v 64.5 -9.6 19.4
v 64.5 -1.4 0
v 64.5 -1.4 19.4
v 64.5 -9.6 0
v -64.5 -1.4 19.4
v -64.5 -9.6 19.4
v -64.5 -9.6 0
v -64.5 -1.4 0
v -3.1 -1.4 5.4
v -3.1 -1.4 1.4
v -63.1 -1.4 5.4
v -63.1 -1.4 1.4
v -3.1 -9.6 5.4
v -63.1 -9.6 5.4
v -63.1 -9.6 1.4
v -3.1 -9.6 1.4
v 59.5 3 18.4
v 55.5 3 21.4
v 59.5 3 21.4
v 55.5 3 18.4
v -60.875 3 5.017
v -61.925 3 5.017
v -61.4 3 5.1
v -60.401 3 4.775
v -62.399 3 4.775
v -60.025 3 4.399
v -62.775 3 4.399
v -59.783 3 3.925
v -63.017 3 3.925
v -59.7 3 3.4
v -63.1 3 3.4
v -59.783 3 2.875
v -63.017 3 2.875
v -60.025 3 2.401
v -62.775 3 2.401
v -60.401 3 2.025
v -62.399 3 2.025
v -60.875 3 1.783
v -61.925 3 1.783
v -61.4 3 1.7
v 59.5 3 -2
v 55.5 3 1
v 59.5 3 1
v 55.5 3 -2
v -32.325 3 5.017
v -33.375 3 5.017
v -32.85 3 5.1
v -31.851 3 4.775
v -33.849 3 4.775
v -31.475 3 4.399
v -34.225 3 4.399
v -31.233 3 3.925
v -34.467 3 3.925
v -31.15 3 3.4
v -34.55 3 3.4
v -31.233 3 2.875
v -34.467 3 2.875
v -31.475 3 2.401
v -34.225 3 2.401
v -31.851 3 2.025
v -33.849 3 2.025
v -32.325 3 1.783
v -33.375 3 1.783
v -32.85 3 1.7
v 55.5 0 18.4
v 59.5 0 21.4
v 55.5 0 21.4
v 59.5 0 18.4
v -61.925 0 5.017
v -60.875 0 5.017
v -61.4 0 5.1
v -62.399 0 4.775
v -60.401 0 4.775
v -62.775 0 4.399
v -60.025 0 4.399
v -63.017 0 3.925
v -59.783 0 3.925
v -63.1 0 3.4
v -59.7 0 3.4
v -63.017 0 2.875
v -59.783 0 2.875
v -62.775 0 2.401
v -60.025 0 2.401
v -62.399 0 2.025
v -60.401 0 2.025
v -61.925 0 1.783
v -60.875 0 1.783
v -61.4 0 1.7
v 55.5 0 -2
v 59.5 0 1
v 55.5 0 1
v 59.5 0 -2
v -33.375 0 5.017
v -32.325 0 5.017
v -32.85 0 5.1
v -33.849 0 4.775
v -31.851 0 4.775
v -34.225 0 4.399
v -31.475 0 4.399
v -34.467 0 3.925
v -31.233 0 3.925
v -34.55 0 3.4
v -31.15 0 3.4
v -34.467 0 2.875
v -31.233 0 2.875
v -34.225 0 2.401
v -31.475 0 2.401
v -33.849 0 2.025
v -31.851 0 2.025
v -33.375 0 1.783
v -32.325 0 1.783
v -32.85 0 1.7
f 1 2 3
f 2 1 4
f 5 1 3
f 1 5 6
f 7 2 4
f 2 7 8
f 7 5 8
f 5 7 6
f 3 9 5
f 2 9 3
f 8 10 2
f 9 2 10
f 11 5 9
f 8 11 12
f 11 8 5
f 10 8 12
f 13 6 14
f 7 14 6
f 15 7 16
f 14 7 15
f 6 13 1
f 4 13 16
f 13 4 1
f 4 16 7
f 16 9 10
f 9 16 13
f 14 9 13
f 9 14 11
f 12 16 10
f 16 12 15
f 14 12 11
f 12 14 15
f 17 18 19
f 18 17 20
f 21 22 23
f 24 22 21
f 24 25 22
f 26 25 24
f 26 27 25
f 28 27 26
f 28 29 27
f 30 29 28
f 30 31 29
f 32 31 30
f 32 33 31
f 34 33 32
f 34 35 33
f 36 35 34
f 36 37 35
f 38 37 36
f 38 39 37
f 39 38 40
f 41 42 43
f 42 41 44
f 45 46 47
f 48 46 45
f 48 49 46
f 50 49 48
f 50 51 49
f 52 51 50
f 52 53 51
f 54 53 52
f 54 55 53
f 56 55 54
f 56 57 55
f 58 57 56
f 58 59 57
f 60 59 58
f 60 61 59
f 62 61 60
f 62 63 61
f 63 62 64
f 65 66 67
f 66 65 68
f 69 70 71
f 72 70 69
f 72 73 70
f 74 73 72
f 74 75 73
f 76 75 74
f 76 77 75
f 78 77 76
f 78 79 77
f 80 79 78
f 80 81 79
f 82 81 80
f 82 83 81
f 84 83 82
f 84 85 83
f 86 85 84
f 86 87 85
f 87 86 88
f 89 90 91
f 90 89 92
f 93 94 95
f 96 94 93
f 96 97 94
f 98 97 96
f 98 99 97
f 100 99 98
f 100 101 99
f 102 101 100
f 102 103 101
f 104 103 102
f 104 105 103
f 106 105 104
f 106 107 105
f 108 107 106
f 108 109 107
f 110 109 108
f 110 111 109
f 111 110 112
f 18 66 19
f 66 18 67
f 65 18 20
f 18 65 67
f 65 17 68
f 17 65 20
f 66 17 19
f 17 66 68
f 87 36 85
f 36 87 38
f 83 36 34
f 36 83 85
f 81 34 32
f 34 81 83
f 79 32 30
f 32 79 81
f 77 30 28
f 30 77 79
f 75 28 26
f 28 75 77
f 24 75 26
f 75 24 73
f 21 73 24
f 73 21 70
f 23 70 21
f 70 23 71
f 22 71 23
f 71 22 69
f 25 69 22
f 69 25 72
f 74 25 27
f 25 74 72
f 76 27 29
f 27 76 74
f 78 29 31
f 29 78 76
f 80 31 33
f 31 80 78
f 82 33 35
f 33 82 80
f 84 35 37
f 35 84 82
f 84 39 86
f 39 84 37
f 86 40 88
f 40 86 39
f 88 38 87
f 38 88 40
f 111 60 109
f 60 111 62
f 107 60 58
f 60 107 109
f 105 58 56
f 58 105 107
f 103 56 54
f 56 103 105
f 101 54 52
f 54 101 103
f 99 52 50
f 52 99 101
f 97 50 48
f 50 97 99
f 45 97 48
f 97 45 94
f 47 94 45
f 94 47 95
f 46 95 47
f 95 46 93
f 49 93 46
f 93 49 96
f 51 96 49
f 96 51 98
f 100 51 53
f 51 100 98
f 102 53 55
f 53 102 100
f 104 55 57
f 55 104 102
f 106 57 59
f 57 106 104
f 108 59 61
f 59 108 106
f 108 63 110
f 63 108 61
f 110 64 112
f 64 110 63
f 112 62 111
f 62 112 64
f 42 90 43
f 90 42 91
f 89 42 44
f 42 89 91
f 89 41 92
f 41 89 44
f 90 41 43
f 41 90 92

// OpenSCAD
// file: smooth_model.scad
// Smoothness Parameters - Modeling
// Developed by: Michael McCool
// Copyright 2016 Intel Corporation
// License: CC-BY.  See LICENSE.md

sm_base = 5;  // base smoothness value for modeling
// file: r200_params.scad
// Basic Model of Intel(R) RealSense(TM) R200 Depth Camera
//   also includes cutting plan for basic mounting
// Developed b0y: Michael McCool
// Copyright 2016 Intel Corporation
// License: CC-BY.  See LICENSE.md

// All units in mm unless noted otherwise.

// CAMERA PARAMETERS

// basic overall size of camera
r200_x = 129;
r200_y = 8.2;
r200_z = 19.4;

// size and location of slot in camera
r200_sx = 60;
r200_sz = 4;
r200_six = 1.4;
r200_siz = 1.4;

// CAMERA MOUNT PARAMETERS
// size of mounting slot in frame
r200_mount_slot_x = 4; // width of slot
r200_mount_slot_y = 2; // height of slot
r200_mount_slot_ey = 1; // slot notch depth (behind camera)
r200_mount_slot_ix = 5; // offset of notch from end of camera

r200_mount_hole_r = m3_hole_radius;
r200_mount_hole_ix = r200_six + r200_mount_hole_r;
r200_mount_hole_iz = r200_siz + r200_sz/2;
r200_mount_hole_dx = r200_sx - r200_mount_hole_r - r200_six;
r200_mount_hole_sm = 4*sm_base;

// thickness of magnetic mounting plate and tape
r200_plate_thick = 1.4;

// defaults 
r200_mount_hole_p = 0.5;  // relative location of inner mounting hole
r200_mount_hole_t = 0.2;  // tolerance of mounting hole
r200_mount_slot_t = 0.0;  // tolerance of mounting slot
// file: bolt_params.scad
// Nuts, Bolts, Spacers, Standoffs, Washers, etc.
//  For visualization only.  
//  Models are missing important details (like threads).
// Developed by: Michael McCool
// Copyright 2017 Intel Corporation
// License: CC-BY-4.0.  See LICENSE.md

// normally include the following externally, so comment out here
//include <tols.scad>
//include <smooth.scad>

// convenience function
function hex_size_to_radius(size) = size / (2 * cos(30));

// Smoothness

// Default colors
bolt_color = [0.5,0.5,0.7,0.9];
nut_color = [0.5,0.6,0.6,0.9];
spacer_color = [0.5,0.5,0.5,0.9];

// Radius of *unthreaded* part of the shaft (exact only for shoulder)
m2_shaft_radius   = 2/2;
m2_5_shaft_radius = 2.5/2;
m3_shaft_radius   = 3/2;
m4_shaft_radius   = 4/2;
m5_shaft_radius   = 5/2;
m6_shaft_radius   = 6/2;

// Threaded part of the shaft is slightly narrower
m2_thread_radius   = 1.86/2;
m2_5_thread_radius = 2.36/2;
m3_thread_radius   = 2.86/2;
m4_thread_radius   = 3.82/2;
m5_thread_radius   = 4.82/2;
m6_thread_radius   = 5.82/2;

// Cap radius
m2_cap_radius   = 4/2;
m2_5_cap_radius = 4.7/2;
m3_cap_radius   = 5.7/2;
m4_cap_radius   = 7.22/2;
m5_cap_radius   = 8.72/2;
m6_cap_radius   = 10.22/2;

// Cap height
m2_cap_height   = 2*m2_shaft_radius;
m2_5_cap_height = 2*m2_5_shaft_radius;
m3_cap_height   = 2*m3_shaft_radius;
m4_cap_height   = 2*m4_shaft_radius;
m5_cap_height   = 2*m5_shaft_radius;
m6_cap_height   = 2*m6_shaft_radius;

// Socket size (from hex face to hex face)
m2_socket_size   = 1.58;
m2_5_socket_size = 2.08;
m3_socket_size   = 2.58;
m4_socket_size   = 3.08;
m5_socket_size   = 4.1;
m6_socket_size   = 5.14;

// Socket radius (center to hex vertex)
m2_socket_radius   = hex_size_to_radius(m2_socket_size);
m2_5_socket_radius = hex_size_to_radius(m2_5_socket_size);
m3_socket_radius   = hex_size_to_radius(m3_socket_size);
m4_socket_radius   = hex_size_to_radius(m4_socket_size);
m5_socket_radius   = hex_size_to_radius(m5_socket_size);
m6_socket_radius   = hex_size_to_radius(m6_socket_size);

// Nut size (from hex face to hex face)
m2_nut_size   = 4;
m2_5_nut_size = 5;
m3_nut_size   = 5.5;
m4_nut_size   = 7;
m5_nut_size   = 8;
m6_nut_size   = 10;

// Nut radius (from center to hex vertex)
m2_nut_radius   = hex_size_to_radius(m2_nut_size);
m2_5_nut_radius = hex_size_to_radius(m2_5_nut_size);
m3_nut_radius   = hex_size_to_radius(m3_nut_size);
m4_nut_radius   = hex_size_to_radius(m4_nut_size);
m5_nut_radius   = hex_size_to_radius(m5_nut_size);
m6_nut_radius   = hex_size_to_radius(m6_nut_size);

// Nut height (face height for lock nuts)
m2_nut_height   = 1.6;
m2_5_nut_height = 2;
m3_nut_height   = 2.4;
m4_nut_height   = 3.2;
m5_nut_height   = 4;
m6_nut_height   = 5;

// Locknut height
m2_locknut_height   = 2.5;
m2_5_locknut_height = 3.8;
m3_locknut_height   = 4;
m4_locknut_height   = 5;
m5_locknut_height   = 5;
m6_locknut_height   = 6;

// Radius to use when cutting a hole for a given bolt size
m2_hole_radius   = m2_shaft_radius + tol/2 + cut_t;
m2_5_hole_radius = m2_5_shaft_radius + tol/2 + cut_t;
m3_hole_radius   = m3_shaft_radius + tol/2 + cut_t;
m4_hole_radius   = m4_shaft_radius + tol/2 + cut_t;
m5_hole_radius   = m5_shaft_radius + tol/2 + cut_t;
m6_hole_radius   = m6_shaft_radius + tol/2 + cut_t;

// "Standard bolt" defaults - for M3 x 10
bolt_shaft_length     = 10;
bolt_shouldere_length = 0;
bolt_shaft_radius     = m3_shaft_radius;
bolt_thread_radius    = m3_thread_radius;
bolt_shaft_sm         = 2*sm_base;
bolt_cap_radius       = m3_cap_radius;
bolt_cap_height       = m3_cap_height;
bolt_socket_size      = m3_socket_size;
bolt_socket_radius    = m3_socket_radius;

bolt_cap_sm           = 4*sm_base;
bolt_shoulder_sm      = 4*sm_base;
bolt_thread_sm        = 2*sm_base;
bolt_hole_sm          = 2*sm_base;

// "Standard nut" defaults - for M3
nut_height = m3_nut_height;
nut_size   = m3_nut_size;
nut_radius = m3_nut_radius;

// "Standard locknut" defaults - for M3
locknut_face_height = m3_nut_height;
locknut_height      = m3_locknut_height;
locknut_size        = m3_nut_size;
locknut_radius      = m3_nut_radius;

// Spacers
m2_spacer_height       = 6;
m2_spacer_hole_radius  = m2_shaft_radius + 2*tol;
m2_spacer_outer_radius = m2_nut_radius;
m2_5_spacer_height       = 6;
m2_5_spacer_hole_radius  = m2_5_shaft_radius + 2*tol;
m2_5_spacer_outer_radius = m2_5_nut_radius;
m3_spacer_height       = 6;
m3_spacer_hole_radius  = m3_shaft_radius + 2*tol;
m3_spacer_outer_radius = m3_nut_radius;
m4_spacer_height       = 6;
m4_spacer_hole_radius  = m4_shaft_radius + 2*tol;
m4_spacer_outer_radius = m4_nut_radius;
m5_spacer_height       = 6;
m5_spacer_hole_radius  = m5_shaft_radius + 2*tol;
m5_spacer_outer_radius = m5_nut_radius;
m6_spacer_height       = 6;
m6_spacer_hole_radius  = m6_shaft_radius + 2*tol;
m6_spacer_outer_radius = m6_nut_radius;

// Spacer defaults
spacer_height       = 6;
spacer_hole_radius  = m3_hole_radius + tol;
spacer_hole_sm      = 2*sm_base;
spacer_outer_radius = spacer_hole_radius + 2;
spacer_outer_sm     = 4*sm_base; 
// file: smooth.scad
// Smoothness Parameters - Default
// Developed by: Michael McCool
// Copyright 2016 Intel Corporation
// License: CC-BY.  See LICENSE.md

//include <smooth_make.scad>
include <smooth_model.scad>
// file: tols.scad
printed = 0;

// TOLERANCES 
tol = 0.1;
eps = 0.0001;

// tolerance around cuts; lasers remove a tiny slice (making holes
// very slightly larger) but 3D printers *add* material (making holes
// smaller... and typically with more "spread").
laser_cut_t = -0.05;  // typical 0.1mm cut width
printed_cut_t = 0.1;  // depends on printer; might need to be up to 0.3

// generic value depends on setting of "printed" variable
cut_t = printed ? printed_cut_t : laser_cut_t; 
// main file
// Basic Model of Intel(R) RealSense(TM) R200 Depth Camera
//   also includes cutting plan for basic mounting
// Developed b0y: Michael McCool
// Copyright 2017 Intel Corporation
// License: CC-BY-4.0.  See LICENSE.md
include <tols.scad>
include <smooth.scad>
include <bolt_params.scad>
include <r200_params.scad>

// All units in mm unless noted otherwise.

mount_hole_sm = 4*sm_base;

// R200 Camera Model (3D)
module r200_camera() {
  color([0.1,0.1,0.7,0.9])
  translate([-r200_x/2,-r200_y-r200_plate_thick,0]) {
    difference() {
      cube([r200_x,r200_y,r200_z]);
      translate([r200_six,-0.05,r200_siz])
        cube([r200_sx,r200_y+0.1,r200_sz]);
    }
  }
}

// R200 Camera Mount Holes (2D)
module r200_camera_mounting_holes(
  hole_p = r200_mount_hole_p,
  hole_t = r200_mount_hole_t,
  slot_t = r200_mount_slot_t
) {
  // holes for bolts
  translate([-r200_x/2+r200_mount_hole_ix+hole_t,r200_mount_hole_iz])
    circle(r=r200_mount_hole_r+hole_t,$fn=mount_hole_sm);
  translate([-r200_x/2+r200_mount_hole_ix+hole_p*r200_mount_hole_dx+hole_t,r200_mount_hole_iz])
    circle(r=r200_mount_hole_r+hole_t,$fn=mount_hole_sm);
  
  // slots for cable tie
  translate([r200_x/2-r200_mount_slot_ix-r200_mount_slot_x-slot_t,-r200_mount_slot_y-slot_t])
    square([r200_mount_slot_x+2*slot_t,r200_mount_slot_y+r200_mount_slot_ey+2*slot_t]);
  translate([r200_x/2-r200_mount_slot_ix-r200_mount_slot_x,r200_z-r200_mount_slot_ey])
    square([r200_mount_slot_x+2*slot_t,r200_mount_slot_y+r200_mount_slot_ey+2*slot_t]);
}

// VISUALIZATION
r200_camera();
translate([0,3,0])
  rotate([90,0,0])
    linear_extrude(3)
      r200_camera_mounting_holes();
